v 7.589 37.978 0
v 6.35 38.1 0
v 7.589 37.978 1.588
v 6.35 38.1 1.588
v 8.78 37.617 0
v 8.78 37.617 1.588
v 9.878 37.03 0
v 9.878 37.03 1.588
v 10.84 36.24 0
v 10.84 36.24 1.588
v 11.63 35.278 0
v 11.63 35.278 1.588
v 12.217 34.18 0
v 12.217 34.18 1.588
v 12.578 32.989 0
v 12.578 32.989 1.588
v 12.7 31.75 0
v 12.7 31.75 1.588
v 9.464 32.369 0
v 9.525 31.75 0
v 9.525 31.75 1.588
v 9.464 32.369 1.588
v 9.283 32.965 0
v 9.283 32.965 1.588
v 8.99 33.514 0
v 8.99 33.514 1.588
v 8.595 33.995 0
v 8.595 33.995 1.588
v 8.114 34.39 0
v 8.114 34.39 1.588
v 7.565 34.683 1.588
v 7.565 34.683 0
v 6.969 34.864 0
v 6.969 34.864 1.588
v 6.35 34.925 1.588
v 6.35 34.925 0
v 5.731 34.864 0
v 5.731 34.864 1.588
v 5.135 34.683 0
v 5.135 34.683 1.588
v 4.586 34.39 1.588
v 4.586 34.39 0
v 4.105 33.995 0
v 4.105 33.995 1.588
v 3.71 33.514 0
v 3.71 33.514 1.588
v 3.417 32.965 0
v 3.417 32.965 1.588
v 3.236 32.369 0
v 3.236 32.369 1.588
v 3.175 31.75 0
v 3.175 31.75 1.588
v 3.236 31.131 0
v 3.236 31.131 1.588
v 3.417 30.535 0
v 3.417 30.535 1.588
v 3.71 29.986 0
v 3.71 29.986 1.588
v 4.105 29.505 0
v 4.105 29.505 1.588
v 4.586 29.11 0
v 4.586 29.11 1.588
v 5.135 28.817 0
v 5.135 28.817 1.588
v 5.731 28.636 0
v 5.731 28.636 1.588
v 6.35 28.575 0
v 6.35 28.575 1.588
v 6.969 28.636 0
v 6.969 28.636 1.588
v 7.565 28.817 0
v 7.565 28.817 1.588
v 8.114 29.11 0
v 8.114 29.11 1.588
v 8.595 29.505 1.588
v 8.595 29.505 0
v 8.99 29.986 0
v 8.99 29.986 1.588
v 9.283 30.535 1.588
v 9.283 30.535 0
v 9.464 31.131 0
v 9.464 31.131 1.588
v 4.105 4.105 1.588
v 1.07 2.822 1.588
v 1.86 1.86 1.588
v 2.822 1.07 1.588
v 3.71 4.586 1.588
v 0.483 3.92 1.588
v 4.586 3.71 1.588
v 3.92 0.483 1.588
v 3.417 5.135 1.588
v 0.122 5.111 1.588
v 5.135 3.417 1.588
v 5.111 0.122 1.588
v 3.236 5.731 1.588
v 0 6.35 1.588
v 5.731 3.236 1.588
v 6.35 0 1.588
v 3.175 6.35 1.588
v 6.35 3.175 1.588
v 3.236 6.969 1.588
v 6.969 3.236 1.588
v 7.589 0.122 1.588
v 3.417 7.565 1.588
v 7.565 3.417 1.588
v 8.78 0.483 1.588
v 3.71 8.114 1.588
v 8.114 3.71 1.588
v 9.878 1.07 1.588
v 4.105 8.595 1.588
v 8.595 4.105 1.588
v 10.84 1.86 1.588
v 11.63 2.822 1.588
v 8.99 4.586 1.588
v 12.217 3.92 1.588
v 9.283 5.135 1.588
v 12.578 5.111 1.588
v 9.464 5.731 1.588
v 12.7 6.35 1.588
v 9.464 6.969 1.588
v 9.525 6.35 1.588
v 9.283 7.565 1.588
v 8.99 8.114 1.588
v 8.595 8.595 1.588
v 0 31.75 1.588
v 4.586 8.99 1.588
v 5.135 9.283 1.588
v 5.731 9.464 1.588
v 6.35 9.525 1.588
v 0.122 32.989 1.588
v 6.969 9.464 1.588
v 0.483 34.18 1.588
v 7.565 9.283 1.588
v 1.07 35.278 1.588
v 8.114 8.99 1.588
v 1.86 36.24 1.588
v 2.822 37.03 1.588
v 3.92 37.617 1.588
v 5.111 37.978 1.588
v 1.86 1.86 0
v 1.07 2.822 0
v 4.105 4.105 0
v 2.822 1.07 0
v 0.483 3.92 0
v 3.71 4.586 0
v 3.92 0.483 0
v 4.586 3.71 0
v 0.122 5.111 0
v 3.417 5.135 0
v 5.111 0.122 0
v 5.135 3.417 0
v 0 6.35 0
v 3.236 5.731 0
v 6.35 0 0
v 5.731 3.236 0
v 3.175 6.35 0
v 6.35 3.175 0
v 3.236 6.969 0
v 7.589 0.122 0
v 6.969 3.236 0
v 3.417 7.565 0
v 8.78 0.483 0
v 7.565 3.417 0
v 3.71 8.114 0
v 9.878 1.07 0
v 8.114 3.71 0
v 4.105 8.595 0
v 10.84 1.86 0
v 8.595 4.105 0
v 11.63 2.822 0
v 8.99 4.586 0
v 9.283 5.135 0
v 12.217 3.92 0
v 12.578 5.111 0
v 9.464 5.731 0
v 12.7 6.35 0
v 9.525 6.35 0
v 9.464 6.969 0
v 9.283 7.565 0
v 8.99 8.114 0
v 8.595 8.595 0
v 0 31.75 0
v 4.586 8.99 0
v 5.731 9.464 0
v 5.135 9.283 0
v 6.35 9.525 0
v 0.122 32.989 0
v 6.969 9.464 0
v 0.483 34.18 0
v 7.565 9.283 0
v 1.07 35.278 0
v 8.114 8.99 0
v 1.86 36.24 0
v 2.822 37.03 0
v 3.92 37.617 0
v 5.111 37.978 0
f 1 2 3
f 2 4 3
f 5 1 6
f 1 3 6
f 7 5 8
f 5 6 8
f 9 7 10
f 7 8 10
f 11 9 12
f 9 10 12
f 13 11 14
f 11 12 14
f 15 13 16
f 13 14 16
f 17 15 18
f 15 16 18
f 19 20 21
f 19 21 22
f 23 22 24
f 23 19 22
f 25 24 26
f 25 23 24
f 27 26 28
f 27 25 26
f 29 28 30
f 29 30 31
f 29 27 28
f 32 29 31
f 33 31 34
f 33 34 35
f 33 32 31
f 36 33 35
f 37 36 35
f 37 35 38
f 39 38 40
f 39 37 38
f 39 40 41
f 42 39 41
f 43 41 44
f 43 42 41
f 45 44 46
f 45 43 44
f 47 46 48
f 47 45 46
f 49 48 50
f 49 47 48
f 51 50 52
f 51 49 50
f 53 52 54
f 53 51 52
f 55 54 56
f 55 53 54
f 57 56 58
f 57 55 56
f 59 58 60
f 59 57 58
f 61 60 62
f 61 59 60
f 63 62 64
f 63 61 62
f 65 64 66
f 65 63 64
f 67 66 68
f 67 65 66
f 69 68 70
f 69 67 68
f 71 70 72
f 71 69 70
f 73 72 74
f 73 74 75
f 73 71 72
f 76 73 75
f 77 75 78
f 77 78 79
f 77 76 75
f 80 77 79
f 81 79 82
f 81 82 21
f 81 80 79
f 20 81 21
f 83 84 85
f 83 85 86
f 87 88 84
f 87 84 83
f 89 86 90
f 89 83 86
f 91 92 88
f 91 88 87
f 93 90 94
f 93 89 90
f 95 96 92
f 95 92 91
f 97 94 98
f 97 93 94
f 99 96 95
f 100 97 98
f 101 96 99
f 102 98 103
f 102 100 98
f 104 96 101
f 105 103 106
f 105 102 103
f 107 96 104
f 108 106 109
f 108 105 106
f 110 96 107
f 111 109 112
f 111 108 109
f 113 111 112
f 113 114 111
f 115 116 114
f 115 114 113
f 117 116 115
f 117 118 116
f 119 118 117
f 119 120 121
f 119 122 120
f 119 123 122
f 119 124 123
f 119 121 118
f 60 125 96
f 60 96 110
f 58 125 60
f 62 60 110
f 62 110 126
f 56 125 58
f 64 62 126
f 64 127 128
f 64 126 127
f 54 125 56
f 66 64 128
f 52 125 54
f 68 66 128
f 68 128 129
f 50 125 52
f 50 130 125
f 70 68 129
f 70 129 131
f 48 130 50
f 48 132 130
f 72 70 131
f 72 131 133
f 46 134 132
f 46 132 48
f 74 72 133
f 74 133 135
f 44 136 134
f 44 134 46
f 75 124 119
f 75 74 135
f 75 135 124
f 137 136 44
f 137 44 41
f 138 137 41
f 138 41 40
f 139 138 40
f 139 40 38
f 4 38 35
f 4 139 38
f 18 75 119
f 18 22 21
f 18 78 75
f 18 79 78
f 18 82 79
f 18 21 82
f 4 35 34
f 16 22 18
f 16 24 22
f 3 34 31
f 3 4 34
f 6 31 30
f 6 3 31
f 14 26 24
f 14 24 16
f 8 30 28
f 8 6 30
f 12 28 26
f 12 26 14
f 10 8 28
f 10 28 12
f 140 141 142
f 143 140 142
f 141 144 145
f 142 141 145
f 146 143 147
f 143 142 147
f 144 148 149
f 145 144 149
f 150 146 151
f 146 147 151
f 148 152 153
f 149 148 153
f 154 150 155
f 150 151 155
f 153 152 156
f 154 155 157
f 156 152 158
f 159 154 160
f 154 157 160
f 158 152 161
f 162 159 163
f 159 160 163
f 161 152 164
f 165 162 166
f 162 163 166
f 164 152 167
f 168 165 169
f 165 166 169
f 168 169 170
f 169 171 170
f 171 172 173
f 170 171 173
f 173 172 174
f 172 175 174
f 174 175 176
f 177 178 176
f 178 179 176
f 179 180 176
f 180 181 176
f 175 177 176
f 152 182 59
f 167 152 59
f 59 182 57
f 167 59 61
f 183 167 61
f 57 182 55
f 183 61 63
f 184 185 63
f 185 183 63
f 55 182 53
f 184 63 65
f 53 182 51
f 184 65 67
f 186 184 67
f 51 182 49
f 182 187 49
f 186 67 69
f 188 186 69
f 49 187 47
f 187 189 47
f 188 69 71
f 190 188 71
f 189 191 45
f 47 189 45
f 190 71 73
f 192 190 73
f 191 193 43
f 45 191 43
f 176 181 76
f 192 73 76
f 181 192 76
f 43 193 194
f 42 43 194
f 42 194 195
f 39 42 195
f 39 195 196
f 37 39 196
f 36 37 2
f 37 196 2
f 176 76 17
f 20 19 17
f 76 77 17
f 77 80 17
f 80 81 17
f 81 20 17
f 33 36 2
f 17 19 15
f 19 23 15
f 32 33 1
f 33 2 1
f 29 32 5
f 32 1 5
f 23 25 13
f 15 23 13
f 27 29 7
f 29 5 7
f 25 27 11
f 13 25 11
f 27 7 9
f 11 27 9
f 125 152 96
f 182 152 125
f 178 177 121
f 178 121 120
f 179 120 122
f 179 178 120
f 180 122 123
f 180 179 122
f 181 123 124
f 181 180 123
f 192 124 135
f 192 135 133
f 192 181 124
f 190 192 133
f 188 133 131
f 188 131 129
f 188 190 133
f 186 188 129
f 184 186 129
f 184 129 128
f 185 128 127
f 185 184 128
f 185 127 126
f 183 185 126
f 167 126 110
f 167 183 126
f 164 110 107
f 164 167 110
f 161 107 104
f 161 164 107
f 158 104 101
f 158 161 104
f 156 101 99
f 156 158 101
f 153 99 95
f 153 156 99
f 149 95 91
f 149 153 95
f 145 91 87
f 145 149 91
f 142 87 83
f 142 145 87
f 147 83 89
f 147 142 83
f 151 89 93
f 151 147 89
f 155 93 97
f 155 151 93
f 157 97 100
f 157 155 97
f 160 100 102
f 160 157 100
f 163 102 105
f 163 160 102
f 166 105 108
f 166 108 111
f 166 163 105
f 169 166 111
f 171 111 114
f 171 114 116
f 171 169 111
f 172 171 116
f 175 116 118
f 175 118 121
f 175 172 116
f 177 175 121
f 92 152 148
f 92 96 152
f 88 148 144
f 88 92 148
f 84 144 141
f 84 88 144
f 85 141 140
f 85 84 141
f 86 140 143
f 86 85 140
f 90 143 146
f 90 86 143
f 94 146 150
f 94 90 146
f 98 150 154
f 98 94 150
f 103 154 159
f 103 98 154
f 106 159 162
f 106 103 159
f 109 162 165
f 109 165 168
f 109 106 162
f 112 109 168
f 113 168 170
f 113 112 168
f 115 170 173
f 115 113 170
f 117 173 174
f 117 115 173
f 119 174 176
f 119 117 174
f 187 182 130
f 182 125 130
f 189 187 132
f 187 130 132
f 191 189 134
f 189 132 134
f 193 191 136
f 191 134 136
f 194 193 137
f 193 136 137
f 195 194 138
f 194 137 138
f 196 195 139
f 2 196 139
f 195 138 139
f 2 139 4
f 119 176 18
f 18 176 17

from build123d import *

# Parameters (mm, degrees)
SKETCH1_W           = 12.7
SKETCH1_H           = 38.1
SKETCH1_R           = 3.175
BOSS_EXTRUDE1_DEPTH = 1.5875
FILLET1_R           = 6.35


with BuildPart() as part:
    # Sketch1 → Boss-Extrude1 (new body)
    with BuildSketch(Plane.XY):
        with Locations((6.35, 19.05)):
            Rectangle(SKETCH1_W, SKETCH1_H)
        with Locations((6.35, 31.75)):
            Circle(SKETCH1_R, mode=Mode.SUBTRACT)
        with Locations((6.35, 6.35)):
            Circle(SKETCH1_R, mode=Mode.SUBTRACT)
    extrude(amount=BOSS_EXTRUDE1_DEPTH)

    # Fillet1
    fillet1_edges = [part.edges().sort_by_distance(p)[0] for p in [
        (12.7, 38.1, 0.79375),
        (0, 38.1, 0.79375),
        (0, 0, 0.79375),
        (12.7, 0, 0.79375),
    ]]
    fillet(fillet1_edges, radius=FILLET1_R - 0.0001)  # a hair under: the kernel refuses the full size


solid = part.part
